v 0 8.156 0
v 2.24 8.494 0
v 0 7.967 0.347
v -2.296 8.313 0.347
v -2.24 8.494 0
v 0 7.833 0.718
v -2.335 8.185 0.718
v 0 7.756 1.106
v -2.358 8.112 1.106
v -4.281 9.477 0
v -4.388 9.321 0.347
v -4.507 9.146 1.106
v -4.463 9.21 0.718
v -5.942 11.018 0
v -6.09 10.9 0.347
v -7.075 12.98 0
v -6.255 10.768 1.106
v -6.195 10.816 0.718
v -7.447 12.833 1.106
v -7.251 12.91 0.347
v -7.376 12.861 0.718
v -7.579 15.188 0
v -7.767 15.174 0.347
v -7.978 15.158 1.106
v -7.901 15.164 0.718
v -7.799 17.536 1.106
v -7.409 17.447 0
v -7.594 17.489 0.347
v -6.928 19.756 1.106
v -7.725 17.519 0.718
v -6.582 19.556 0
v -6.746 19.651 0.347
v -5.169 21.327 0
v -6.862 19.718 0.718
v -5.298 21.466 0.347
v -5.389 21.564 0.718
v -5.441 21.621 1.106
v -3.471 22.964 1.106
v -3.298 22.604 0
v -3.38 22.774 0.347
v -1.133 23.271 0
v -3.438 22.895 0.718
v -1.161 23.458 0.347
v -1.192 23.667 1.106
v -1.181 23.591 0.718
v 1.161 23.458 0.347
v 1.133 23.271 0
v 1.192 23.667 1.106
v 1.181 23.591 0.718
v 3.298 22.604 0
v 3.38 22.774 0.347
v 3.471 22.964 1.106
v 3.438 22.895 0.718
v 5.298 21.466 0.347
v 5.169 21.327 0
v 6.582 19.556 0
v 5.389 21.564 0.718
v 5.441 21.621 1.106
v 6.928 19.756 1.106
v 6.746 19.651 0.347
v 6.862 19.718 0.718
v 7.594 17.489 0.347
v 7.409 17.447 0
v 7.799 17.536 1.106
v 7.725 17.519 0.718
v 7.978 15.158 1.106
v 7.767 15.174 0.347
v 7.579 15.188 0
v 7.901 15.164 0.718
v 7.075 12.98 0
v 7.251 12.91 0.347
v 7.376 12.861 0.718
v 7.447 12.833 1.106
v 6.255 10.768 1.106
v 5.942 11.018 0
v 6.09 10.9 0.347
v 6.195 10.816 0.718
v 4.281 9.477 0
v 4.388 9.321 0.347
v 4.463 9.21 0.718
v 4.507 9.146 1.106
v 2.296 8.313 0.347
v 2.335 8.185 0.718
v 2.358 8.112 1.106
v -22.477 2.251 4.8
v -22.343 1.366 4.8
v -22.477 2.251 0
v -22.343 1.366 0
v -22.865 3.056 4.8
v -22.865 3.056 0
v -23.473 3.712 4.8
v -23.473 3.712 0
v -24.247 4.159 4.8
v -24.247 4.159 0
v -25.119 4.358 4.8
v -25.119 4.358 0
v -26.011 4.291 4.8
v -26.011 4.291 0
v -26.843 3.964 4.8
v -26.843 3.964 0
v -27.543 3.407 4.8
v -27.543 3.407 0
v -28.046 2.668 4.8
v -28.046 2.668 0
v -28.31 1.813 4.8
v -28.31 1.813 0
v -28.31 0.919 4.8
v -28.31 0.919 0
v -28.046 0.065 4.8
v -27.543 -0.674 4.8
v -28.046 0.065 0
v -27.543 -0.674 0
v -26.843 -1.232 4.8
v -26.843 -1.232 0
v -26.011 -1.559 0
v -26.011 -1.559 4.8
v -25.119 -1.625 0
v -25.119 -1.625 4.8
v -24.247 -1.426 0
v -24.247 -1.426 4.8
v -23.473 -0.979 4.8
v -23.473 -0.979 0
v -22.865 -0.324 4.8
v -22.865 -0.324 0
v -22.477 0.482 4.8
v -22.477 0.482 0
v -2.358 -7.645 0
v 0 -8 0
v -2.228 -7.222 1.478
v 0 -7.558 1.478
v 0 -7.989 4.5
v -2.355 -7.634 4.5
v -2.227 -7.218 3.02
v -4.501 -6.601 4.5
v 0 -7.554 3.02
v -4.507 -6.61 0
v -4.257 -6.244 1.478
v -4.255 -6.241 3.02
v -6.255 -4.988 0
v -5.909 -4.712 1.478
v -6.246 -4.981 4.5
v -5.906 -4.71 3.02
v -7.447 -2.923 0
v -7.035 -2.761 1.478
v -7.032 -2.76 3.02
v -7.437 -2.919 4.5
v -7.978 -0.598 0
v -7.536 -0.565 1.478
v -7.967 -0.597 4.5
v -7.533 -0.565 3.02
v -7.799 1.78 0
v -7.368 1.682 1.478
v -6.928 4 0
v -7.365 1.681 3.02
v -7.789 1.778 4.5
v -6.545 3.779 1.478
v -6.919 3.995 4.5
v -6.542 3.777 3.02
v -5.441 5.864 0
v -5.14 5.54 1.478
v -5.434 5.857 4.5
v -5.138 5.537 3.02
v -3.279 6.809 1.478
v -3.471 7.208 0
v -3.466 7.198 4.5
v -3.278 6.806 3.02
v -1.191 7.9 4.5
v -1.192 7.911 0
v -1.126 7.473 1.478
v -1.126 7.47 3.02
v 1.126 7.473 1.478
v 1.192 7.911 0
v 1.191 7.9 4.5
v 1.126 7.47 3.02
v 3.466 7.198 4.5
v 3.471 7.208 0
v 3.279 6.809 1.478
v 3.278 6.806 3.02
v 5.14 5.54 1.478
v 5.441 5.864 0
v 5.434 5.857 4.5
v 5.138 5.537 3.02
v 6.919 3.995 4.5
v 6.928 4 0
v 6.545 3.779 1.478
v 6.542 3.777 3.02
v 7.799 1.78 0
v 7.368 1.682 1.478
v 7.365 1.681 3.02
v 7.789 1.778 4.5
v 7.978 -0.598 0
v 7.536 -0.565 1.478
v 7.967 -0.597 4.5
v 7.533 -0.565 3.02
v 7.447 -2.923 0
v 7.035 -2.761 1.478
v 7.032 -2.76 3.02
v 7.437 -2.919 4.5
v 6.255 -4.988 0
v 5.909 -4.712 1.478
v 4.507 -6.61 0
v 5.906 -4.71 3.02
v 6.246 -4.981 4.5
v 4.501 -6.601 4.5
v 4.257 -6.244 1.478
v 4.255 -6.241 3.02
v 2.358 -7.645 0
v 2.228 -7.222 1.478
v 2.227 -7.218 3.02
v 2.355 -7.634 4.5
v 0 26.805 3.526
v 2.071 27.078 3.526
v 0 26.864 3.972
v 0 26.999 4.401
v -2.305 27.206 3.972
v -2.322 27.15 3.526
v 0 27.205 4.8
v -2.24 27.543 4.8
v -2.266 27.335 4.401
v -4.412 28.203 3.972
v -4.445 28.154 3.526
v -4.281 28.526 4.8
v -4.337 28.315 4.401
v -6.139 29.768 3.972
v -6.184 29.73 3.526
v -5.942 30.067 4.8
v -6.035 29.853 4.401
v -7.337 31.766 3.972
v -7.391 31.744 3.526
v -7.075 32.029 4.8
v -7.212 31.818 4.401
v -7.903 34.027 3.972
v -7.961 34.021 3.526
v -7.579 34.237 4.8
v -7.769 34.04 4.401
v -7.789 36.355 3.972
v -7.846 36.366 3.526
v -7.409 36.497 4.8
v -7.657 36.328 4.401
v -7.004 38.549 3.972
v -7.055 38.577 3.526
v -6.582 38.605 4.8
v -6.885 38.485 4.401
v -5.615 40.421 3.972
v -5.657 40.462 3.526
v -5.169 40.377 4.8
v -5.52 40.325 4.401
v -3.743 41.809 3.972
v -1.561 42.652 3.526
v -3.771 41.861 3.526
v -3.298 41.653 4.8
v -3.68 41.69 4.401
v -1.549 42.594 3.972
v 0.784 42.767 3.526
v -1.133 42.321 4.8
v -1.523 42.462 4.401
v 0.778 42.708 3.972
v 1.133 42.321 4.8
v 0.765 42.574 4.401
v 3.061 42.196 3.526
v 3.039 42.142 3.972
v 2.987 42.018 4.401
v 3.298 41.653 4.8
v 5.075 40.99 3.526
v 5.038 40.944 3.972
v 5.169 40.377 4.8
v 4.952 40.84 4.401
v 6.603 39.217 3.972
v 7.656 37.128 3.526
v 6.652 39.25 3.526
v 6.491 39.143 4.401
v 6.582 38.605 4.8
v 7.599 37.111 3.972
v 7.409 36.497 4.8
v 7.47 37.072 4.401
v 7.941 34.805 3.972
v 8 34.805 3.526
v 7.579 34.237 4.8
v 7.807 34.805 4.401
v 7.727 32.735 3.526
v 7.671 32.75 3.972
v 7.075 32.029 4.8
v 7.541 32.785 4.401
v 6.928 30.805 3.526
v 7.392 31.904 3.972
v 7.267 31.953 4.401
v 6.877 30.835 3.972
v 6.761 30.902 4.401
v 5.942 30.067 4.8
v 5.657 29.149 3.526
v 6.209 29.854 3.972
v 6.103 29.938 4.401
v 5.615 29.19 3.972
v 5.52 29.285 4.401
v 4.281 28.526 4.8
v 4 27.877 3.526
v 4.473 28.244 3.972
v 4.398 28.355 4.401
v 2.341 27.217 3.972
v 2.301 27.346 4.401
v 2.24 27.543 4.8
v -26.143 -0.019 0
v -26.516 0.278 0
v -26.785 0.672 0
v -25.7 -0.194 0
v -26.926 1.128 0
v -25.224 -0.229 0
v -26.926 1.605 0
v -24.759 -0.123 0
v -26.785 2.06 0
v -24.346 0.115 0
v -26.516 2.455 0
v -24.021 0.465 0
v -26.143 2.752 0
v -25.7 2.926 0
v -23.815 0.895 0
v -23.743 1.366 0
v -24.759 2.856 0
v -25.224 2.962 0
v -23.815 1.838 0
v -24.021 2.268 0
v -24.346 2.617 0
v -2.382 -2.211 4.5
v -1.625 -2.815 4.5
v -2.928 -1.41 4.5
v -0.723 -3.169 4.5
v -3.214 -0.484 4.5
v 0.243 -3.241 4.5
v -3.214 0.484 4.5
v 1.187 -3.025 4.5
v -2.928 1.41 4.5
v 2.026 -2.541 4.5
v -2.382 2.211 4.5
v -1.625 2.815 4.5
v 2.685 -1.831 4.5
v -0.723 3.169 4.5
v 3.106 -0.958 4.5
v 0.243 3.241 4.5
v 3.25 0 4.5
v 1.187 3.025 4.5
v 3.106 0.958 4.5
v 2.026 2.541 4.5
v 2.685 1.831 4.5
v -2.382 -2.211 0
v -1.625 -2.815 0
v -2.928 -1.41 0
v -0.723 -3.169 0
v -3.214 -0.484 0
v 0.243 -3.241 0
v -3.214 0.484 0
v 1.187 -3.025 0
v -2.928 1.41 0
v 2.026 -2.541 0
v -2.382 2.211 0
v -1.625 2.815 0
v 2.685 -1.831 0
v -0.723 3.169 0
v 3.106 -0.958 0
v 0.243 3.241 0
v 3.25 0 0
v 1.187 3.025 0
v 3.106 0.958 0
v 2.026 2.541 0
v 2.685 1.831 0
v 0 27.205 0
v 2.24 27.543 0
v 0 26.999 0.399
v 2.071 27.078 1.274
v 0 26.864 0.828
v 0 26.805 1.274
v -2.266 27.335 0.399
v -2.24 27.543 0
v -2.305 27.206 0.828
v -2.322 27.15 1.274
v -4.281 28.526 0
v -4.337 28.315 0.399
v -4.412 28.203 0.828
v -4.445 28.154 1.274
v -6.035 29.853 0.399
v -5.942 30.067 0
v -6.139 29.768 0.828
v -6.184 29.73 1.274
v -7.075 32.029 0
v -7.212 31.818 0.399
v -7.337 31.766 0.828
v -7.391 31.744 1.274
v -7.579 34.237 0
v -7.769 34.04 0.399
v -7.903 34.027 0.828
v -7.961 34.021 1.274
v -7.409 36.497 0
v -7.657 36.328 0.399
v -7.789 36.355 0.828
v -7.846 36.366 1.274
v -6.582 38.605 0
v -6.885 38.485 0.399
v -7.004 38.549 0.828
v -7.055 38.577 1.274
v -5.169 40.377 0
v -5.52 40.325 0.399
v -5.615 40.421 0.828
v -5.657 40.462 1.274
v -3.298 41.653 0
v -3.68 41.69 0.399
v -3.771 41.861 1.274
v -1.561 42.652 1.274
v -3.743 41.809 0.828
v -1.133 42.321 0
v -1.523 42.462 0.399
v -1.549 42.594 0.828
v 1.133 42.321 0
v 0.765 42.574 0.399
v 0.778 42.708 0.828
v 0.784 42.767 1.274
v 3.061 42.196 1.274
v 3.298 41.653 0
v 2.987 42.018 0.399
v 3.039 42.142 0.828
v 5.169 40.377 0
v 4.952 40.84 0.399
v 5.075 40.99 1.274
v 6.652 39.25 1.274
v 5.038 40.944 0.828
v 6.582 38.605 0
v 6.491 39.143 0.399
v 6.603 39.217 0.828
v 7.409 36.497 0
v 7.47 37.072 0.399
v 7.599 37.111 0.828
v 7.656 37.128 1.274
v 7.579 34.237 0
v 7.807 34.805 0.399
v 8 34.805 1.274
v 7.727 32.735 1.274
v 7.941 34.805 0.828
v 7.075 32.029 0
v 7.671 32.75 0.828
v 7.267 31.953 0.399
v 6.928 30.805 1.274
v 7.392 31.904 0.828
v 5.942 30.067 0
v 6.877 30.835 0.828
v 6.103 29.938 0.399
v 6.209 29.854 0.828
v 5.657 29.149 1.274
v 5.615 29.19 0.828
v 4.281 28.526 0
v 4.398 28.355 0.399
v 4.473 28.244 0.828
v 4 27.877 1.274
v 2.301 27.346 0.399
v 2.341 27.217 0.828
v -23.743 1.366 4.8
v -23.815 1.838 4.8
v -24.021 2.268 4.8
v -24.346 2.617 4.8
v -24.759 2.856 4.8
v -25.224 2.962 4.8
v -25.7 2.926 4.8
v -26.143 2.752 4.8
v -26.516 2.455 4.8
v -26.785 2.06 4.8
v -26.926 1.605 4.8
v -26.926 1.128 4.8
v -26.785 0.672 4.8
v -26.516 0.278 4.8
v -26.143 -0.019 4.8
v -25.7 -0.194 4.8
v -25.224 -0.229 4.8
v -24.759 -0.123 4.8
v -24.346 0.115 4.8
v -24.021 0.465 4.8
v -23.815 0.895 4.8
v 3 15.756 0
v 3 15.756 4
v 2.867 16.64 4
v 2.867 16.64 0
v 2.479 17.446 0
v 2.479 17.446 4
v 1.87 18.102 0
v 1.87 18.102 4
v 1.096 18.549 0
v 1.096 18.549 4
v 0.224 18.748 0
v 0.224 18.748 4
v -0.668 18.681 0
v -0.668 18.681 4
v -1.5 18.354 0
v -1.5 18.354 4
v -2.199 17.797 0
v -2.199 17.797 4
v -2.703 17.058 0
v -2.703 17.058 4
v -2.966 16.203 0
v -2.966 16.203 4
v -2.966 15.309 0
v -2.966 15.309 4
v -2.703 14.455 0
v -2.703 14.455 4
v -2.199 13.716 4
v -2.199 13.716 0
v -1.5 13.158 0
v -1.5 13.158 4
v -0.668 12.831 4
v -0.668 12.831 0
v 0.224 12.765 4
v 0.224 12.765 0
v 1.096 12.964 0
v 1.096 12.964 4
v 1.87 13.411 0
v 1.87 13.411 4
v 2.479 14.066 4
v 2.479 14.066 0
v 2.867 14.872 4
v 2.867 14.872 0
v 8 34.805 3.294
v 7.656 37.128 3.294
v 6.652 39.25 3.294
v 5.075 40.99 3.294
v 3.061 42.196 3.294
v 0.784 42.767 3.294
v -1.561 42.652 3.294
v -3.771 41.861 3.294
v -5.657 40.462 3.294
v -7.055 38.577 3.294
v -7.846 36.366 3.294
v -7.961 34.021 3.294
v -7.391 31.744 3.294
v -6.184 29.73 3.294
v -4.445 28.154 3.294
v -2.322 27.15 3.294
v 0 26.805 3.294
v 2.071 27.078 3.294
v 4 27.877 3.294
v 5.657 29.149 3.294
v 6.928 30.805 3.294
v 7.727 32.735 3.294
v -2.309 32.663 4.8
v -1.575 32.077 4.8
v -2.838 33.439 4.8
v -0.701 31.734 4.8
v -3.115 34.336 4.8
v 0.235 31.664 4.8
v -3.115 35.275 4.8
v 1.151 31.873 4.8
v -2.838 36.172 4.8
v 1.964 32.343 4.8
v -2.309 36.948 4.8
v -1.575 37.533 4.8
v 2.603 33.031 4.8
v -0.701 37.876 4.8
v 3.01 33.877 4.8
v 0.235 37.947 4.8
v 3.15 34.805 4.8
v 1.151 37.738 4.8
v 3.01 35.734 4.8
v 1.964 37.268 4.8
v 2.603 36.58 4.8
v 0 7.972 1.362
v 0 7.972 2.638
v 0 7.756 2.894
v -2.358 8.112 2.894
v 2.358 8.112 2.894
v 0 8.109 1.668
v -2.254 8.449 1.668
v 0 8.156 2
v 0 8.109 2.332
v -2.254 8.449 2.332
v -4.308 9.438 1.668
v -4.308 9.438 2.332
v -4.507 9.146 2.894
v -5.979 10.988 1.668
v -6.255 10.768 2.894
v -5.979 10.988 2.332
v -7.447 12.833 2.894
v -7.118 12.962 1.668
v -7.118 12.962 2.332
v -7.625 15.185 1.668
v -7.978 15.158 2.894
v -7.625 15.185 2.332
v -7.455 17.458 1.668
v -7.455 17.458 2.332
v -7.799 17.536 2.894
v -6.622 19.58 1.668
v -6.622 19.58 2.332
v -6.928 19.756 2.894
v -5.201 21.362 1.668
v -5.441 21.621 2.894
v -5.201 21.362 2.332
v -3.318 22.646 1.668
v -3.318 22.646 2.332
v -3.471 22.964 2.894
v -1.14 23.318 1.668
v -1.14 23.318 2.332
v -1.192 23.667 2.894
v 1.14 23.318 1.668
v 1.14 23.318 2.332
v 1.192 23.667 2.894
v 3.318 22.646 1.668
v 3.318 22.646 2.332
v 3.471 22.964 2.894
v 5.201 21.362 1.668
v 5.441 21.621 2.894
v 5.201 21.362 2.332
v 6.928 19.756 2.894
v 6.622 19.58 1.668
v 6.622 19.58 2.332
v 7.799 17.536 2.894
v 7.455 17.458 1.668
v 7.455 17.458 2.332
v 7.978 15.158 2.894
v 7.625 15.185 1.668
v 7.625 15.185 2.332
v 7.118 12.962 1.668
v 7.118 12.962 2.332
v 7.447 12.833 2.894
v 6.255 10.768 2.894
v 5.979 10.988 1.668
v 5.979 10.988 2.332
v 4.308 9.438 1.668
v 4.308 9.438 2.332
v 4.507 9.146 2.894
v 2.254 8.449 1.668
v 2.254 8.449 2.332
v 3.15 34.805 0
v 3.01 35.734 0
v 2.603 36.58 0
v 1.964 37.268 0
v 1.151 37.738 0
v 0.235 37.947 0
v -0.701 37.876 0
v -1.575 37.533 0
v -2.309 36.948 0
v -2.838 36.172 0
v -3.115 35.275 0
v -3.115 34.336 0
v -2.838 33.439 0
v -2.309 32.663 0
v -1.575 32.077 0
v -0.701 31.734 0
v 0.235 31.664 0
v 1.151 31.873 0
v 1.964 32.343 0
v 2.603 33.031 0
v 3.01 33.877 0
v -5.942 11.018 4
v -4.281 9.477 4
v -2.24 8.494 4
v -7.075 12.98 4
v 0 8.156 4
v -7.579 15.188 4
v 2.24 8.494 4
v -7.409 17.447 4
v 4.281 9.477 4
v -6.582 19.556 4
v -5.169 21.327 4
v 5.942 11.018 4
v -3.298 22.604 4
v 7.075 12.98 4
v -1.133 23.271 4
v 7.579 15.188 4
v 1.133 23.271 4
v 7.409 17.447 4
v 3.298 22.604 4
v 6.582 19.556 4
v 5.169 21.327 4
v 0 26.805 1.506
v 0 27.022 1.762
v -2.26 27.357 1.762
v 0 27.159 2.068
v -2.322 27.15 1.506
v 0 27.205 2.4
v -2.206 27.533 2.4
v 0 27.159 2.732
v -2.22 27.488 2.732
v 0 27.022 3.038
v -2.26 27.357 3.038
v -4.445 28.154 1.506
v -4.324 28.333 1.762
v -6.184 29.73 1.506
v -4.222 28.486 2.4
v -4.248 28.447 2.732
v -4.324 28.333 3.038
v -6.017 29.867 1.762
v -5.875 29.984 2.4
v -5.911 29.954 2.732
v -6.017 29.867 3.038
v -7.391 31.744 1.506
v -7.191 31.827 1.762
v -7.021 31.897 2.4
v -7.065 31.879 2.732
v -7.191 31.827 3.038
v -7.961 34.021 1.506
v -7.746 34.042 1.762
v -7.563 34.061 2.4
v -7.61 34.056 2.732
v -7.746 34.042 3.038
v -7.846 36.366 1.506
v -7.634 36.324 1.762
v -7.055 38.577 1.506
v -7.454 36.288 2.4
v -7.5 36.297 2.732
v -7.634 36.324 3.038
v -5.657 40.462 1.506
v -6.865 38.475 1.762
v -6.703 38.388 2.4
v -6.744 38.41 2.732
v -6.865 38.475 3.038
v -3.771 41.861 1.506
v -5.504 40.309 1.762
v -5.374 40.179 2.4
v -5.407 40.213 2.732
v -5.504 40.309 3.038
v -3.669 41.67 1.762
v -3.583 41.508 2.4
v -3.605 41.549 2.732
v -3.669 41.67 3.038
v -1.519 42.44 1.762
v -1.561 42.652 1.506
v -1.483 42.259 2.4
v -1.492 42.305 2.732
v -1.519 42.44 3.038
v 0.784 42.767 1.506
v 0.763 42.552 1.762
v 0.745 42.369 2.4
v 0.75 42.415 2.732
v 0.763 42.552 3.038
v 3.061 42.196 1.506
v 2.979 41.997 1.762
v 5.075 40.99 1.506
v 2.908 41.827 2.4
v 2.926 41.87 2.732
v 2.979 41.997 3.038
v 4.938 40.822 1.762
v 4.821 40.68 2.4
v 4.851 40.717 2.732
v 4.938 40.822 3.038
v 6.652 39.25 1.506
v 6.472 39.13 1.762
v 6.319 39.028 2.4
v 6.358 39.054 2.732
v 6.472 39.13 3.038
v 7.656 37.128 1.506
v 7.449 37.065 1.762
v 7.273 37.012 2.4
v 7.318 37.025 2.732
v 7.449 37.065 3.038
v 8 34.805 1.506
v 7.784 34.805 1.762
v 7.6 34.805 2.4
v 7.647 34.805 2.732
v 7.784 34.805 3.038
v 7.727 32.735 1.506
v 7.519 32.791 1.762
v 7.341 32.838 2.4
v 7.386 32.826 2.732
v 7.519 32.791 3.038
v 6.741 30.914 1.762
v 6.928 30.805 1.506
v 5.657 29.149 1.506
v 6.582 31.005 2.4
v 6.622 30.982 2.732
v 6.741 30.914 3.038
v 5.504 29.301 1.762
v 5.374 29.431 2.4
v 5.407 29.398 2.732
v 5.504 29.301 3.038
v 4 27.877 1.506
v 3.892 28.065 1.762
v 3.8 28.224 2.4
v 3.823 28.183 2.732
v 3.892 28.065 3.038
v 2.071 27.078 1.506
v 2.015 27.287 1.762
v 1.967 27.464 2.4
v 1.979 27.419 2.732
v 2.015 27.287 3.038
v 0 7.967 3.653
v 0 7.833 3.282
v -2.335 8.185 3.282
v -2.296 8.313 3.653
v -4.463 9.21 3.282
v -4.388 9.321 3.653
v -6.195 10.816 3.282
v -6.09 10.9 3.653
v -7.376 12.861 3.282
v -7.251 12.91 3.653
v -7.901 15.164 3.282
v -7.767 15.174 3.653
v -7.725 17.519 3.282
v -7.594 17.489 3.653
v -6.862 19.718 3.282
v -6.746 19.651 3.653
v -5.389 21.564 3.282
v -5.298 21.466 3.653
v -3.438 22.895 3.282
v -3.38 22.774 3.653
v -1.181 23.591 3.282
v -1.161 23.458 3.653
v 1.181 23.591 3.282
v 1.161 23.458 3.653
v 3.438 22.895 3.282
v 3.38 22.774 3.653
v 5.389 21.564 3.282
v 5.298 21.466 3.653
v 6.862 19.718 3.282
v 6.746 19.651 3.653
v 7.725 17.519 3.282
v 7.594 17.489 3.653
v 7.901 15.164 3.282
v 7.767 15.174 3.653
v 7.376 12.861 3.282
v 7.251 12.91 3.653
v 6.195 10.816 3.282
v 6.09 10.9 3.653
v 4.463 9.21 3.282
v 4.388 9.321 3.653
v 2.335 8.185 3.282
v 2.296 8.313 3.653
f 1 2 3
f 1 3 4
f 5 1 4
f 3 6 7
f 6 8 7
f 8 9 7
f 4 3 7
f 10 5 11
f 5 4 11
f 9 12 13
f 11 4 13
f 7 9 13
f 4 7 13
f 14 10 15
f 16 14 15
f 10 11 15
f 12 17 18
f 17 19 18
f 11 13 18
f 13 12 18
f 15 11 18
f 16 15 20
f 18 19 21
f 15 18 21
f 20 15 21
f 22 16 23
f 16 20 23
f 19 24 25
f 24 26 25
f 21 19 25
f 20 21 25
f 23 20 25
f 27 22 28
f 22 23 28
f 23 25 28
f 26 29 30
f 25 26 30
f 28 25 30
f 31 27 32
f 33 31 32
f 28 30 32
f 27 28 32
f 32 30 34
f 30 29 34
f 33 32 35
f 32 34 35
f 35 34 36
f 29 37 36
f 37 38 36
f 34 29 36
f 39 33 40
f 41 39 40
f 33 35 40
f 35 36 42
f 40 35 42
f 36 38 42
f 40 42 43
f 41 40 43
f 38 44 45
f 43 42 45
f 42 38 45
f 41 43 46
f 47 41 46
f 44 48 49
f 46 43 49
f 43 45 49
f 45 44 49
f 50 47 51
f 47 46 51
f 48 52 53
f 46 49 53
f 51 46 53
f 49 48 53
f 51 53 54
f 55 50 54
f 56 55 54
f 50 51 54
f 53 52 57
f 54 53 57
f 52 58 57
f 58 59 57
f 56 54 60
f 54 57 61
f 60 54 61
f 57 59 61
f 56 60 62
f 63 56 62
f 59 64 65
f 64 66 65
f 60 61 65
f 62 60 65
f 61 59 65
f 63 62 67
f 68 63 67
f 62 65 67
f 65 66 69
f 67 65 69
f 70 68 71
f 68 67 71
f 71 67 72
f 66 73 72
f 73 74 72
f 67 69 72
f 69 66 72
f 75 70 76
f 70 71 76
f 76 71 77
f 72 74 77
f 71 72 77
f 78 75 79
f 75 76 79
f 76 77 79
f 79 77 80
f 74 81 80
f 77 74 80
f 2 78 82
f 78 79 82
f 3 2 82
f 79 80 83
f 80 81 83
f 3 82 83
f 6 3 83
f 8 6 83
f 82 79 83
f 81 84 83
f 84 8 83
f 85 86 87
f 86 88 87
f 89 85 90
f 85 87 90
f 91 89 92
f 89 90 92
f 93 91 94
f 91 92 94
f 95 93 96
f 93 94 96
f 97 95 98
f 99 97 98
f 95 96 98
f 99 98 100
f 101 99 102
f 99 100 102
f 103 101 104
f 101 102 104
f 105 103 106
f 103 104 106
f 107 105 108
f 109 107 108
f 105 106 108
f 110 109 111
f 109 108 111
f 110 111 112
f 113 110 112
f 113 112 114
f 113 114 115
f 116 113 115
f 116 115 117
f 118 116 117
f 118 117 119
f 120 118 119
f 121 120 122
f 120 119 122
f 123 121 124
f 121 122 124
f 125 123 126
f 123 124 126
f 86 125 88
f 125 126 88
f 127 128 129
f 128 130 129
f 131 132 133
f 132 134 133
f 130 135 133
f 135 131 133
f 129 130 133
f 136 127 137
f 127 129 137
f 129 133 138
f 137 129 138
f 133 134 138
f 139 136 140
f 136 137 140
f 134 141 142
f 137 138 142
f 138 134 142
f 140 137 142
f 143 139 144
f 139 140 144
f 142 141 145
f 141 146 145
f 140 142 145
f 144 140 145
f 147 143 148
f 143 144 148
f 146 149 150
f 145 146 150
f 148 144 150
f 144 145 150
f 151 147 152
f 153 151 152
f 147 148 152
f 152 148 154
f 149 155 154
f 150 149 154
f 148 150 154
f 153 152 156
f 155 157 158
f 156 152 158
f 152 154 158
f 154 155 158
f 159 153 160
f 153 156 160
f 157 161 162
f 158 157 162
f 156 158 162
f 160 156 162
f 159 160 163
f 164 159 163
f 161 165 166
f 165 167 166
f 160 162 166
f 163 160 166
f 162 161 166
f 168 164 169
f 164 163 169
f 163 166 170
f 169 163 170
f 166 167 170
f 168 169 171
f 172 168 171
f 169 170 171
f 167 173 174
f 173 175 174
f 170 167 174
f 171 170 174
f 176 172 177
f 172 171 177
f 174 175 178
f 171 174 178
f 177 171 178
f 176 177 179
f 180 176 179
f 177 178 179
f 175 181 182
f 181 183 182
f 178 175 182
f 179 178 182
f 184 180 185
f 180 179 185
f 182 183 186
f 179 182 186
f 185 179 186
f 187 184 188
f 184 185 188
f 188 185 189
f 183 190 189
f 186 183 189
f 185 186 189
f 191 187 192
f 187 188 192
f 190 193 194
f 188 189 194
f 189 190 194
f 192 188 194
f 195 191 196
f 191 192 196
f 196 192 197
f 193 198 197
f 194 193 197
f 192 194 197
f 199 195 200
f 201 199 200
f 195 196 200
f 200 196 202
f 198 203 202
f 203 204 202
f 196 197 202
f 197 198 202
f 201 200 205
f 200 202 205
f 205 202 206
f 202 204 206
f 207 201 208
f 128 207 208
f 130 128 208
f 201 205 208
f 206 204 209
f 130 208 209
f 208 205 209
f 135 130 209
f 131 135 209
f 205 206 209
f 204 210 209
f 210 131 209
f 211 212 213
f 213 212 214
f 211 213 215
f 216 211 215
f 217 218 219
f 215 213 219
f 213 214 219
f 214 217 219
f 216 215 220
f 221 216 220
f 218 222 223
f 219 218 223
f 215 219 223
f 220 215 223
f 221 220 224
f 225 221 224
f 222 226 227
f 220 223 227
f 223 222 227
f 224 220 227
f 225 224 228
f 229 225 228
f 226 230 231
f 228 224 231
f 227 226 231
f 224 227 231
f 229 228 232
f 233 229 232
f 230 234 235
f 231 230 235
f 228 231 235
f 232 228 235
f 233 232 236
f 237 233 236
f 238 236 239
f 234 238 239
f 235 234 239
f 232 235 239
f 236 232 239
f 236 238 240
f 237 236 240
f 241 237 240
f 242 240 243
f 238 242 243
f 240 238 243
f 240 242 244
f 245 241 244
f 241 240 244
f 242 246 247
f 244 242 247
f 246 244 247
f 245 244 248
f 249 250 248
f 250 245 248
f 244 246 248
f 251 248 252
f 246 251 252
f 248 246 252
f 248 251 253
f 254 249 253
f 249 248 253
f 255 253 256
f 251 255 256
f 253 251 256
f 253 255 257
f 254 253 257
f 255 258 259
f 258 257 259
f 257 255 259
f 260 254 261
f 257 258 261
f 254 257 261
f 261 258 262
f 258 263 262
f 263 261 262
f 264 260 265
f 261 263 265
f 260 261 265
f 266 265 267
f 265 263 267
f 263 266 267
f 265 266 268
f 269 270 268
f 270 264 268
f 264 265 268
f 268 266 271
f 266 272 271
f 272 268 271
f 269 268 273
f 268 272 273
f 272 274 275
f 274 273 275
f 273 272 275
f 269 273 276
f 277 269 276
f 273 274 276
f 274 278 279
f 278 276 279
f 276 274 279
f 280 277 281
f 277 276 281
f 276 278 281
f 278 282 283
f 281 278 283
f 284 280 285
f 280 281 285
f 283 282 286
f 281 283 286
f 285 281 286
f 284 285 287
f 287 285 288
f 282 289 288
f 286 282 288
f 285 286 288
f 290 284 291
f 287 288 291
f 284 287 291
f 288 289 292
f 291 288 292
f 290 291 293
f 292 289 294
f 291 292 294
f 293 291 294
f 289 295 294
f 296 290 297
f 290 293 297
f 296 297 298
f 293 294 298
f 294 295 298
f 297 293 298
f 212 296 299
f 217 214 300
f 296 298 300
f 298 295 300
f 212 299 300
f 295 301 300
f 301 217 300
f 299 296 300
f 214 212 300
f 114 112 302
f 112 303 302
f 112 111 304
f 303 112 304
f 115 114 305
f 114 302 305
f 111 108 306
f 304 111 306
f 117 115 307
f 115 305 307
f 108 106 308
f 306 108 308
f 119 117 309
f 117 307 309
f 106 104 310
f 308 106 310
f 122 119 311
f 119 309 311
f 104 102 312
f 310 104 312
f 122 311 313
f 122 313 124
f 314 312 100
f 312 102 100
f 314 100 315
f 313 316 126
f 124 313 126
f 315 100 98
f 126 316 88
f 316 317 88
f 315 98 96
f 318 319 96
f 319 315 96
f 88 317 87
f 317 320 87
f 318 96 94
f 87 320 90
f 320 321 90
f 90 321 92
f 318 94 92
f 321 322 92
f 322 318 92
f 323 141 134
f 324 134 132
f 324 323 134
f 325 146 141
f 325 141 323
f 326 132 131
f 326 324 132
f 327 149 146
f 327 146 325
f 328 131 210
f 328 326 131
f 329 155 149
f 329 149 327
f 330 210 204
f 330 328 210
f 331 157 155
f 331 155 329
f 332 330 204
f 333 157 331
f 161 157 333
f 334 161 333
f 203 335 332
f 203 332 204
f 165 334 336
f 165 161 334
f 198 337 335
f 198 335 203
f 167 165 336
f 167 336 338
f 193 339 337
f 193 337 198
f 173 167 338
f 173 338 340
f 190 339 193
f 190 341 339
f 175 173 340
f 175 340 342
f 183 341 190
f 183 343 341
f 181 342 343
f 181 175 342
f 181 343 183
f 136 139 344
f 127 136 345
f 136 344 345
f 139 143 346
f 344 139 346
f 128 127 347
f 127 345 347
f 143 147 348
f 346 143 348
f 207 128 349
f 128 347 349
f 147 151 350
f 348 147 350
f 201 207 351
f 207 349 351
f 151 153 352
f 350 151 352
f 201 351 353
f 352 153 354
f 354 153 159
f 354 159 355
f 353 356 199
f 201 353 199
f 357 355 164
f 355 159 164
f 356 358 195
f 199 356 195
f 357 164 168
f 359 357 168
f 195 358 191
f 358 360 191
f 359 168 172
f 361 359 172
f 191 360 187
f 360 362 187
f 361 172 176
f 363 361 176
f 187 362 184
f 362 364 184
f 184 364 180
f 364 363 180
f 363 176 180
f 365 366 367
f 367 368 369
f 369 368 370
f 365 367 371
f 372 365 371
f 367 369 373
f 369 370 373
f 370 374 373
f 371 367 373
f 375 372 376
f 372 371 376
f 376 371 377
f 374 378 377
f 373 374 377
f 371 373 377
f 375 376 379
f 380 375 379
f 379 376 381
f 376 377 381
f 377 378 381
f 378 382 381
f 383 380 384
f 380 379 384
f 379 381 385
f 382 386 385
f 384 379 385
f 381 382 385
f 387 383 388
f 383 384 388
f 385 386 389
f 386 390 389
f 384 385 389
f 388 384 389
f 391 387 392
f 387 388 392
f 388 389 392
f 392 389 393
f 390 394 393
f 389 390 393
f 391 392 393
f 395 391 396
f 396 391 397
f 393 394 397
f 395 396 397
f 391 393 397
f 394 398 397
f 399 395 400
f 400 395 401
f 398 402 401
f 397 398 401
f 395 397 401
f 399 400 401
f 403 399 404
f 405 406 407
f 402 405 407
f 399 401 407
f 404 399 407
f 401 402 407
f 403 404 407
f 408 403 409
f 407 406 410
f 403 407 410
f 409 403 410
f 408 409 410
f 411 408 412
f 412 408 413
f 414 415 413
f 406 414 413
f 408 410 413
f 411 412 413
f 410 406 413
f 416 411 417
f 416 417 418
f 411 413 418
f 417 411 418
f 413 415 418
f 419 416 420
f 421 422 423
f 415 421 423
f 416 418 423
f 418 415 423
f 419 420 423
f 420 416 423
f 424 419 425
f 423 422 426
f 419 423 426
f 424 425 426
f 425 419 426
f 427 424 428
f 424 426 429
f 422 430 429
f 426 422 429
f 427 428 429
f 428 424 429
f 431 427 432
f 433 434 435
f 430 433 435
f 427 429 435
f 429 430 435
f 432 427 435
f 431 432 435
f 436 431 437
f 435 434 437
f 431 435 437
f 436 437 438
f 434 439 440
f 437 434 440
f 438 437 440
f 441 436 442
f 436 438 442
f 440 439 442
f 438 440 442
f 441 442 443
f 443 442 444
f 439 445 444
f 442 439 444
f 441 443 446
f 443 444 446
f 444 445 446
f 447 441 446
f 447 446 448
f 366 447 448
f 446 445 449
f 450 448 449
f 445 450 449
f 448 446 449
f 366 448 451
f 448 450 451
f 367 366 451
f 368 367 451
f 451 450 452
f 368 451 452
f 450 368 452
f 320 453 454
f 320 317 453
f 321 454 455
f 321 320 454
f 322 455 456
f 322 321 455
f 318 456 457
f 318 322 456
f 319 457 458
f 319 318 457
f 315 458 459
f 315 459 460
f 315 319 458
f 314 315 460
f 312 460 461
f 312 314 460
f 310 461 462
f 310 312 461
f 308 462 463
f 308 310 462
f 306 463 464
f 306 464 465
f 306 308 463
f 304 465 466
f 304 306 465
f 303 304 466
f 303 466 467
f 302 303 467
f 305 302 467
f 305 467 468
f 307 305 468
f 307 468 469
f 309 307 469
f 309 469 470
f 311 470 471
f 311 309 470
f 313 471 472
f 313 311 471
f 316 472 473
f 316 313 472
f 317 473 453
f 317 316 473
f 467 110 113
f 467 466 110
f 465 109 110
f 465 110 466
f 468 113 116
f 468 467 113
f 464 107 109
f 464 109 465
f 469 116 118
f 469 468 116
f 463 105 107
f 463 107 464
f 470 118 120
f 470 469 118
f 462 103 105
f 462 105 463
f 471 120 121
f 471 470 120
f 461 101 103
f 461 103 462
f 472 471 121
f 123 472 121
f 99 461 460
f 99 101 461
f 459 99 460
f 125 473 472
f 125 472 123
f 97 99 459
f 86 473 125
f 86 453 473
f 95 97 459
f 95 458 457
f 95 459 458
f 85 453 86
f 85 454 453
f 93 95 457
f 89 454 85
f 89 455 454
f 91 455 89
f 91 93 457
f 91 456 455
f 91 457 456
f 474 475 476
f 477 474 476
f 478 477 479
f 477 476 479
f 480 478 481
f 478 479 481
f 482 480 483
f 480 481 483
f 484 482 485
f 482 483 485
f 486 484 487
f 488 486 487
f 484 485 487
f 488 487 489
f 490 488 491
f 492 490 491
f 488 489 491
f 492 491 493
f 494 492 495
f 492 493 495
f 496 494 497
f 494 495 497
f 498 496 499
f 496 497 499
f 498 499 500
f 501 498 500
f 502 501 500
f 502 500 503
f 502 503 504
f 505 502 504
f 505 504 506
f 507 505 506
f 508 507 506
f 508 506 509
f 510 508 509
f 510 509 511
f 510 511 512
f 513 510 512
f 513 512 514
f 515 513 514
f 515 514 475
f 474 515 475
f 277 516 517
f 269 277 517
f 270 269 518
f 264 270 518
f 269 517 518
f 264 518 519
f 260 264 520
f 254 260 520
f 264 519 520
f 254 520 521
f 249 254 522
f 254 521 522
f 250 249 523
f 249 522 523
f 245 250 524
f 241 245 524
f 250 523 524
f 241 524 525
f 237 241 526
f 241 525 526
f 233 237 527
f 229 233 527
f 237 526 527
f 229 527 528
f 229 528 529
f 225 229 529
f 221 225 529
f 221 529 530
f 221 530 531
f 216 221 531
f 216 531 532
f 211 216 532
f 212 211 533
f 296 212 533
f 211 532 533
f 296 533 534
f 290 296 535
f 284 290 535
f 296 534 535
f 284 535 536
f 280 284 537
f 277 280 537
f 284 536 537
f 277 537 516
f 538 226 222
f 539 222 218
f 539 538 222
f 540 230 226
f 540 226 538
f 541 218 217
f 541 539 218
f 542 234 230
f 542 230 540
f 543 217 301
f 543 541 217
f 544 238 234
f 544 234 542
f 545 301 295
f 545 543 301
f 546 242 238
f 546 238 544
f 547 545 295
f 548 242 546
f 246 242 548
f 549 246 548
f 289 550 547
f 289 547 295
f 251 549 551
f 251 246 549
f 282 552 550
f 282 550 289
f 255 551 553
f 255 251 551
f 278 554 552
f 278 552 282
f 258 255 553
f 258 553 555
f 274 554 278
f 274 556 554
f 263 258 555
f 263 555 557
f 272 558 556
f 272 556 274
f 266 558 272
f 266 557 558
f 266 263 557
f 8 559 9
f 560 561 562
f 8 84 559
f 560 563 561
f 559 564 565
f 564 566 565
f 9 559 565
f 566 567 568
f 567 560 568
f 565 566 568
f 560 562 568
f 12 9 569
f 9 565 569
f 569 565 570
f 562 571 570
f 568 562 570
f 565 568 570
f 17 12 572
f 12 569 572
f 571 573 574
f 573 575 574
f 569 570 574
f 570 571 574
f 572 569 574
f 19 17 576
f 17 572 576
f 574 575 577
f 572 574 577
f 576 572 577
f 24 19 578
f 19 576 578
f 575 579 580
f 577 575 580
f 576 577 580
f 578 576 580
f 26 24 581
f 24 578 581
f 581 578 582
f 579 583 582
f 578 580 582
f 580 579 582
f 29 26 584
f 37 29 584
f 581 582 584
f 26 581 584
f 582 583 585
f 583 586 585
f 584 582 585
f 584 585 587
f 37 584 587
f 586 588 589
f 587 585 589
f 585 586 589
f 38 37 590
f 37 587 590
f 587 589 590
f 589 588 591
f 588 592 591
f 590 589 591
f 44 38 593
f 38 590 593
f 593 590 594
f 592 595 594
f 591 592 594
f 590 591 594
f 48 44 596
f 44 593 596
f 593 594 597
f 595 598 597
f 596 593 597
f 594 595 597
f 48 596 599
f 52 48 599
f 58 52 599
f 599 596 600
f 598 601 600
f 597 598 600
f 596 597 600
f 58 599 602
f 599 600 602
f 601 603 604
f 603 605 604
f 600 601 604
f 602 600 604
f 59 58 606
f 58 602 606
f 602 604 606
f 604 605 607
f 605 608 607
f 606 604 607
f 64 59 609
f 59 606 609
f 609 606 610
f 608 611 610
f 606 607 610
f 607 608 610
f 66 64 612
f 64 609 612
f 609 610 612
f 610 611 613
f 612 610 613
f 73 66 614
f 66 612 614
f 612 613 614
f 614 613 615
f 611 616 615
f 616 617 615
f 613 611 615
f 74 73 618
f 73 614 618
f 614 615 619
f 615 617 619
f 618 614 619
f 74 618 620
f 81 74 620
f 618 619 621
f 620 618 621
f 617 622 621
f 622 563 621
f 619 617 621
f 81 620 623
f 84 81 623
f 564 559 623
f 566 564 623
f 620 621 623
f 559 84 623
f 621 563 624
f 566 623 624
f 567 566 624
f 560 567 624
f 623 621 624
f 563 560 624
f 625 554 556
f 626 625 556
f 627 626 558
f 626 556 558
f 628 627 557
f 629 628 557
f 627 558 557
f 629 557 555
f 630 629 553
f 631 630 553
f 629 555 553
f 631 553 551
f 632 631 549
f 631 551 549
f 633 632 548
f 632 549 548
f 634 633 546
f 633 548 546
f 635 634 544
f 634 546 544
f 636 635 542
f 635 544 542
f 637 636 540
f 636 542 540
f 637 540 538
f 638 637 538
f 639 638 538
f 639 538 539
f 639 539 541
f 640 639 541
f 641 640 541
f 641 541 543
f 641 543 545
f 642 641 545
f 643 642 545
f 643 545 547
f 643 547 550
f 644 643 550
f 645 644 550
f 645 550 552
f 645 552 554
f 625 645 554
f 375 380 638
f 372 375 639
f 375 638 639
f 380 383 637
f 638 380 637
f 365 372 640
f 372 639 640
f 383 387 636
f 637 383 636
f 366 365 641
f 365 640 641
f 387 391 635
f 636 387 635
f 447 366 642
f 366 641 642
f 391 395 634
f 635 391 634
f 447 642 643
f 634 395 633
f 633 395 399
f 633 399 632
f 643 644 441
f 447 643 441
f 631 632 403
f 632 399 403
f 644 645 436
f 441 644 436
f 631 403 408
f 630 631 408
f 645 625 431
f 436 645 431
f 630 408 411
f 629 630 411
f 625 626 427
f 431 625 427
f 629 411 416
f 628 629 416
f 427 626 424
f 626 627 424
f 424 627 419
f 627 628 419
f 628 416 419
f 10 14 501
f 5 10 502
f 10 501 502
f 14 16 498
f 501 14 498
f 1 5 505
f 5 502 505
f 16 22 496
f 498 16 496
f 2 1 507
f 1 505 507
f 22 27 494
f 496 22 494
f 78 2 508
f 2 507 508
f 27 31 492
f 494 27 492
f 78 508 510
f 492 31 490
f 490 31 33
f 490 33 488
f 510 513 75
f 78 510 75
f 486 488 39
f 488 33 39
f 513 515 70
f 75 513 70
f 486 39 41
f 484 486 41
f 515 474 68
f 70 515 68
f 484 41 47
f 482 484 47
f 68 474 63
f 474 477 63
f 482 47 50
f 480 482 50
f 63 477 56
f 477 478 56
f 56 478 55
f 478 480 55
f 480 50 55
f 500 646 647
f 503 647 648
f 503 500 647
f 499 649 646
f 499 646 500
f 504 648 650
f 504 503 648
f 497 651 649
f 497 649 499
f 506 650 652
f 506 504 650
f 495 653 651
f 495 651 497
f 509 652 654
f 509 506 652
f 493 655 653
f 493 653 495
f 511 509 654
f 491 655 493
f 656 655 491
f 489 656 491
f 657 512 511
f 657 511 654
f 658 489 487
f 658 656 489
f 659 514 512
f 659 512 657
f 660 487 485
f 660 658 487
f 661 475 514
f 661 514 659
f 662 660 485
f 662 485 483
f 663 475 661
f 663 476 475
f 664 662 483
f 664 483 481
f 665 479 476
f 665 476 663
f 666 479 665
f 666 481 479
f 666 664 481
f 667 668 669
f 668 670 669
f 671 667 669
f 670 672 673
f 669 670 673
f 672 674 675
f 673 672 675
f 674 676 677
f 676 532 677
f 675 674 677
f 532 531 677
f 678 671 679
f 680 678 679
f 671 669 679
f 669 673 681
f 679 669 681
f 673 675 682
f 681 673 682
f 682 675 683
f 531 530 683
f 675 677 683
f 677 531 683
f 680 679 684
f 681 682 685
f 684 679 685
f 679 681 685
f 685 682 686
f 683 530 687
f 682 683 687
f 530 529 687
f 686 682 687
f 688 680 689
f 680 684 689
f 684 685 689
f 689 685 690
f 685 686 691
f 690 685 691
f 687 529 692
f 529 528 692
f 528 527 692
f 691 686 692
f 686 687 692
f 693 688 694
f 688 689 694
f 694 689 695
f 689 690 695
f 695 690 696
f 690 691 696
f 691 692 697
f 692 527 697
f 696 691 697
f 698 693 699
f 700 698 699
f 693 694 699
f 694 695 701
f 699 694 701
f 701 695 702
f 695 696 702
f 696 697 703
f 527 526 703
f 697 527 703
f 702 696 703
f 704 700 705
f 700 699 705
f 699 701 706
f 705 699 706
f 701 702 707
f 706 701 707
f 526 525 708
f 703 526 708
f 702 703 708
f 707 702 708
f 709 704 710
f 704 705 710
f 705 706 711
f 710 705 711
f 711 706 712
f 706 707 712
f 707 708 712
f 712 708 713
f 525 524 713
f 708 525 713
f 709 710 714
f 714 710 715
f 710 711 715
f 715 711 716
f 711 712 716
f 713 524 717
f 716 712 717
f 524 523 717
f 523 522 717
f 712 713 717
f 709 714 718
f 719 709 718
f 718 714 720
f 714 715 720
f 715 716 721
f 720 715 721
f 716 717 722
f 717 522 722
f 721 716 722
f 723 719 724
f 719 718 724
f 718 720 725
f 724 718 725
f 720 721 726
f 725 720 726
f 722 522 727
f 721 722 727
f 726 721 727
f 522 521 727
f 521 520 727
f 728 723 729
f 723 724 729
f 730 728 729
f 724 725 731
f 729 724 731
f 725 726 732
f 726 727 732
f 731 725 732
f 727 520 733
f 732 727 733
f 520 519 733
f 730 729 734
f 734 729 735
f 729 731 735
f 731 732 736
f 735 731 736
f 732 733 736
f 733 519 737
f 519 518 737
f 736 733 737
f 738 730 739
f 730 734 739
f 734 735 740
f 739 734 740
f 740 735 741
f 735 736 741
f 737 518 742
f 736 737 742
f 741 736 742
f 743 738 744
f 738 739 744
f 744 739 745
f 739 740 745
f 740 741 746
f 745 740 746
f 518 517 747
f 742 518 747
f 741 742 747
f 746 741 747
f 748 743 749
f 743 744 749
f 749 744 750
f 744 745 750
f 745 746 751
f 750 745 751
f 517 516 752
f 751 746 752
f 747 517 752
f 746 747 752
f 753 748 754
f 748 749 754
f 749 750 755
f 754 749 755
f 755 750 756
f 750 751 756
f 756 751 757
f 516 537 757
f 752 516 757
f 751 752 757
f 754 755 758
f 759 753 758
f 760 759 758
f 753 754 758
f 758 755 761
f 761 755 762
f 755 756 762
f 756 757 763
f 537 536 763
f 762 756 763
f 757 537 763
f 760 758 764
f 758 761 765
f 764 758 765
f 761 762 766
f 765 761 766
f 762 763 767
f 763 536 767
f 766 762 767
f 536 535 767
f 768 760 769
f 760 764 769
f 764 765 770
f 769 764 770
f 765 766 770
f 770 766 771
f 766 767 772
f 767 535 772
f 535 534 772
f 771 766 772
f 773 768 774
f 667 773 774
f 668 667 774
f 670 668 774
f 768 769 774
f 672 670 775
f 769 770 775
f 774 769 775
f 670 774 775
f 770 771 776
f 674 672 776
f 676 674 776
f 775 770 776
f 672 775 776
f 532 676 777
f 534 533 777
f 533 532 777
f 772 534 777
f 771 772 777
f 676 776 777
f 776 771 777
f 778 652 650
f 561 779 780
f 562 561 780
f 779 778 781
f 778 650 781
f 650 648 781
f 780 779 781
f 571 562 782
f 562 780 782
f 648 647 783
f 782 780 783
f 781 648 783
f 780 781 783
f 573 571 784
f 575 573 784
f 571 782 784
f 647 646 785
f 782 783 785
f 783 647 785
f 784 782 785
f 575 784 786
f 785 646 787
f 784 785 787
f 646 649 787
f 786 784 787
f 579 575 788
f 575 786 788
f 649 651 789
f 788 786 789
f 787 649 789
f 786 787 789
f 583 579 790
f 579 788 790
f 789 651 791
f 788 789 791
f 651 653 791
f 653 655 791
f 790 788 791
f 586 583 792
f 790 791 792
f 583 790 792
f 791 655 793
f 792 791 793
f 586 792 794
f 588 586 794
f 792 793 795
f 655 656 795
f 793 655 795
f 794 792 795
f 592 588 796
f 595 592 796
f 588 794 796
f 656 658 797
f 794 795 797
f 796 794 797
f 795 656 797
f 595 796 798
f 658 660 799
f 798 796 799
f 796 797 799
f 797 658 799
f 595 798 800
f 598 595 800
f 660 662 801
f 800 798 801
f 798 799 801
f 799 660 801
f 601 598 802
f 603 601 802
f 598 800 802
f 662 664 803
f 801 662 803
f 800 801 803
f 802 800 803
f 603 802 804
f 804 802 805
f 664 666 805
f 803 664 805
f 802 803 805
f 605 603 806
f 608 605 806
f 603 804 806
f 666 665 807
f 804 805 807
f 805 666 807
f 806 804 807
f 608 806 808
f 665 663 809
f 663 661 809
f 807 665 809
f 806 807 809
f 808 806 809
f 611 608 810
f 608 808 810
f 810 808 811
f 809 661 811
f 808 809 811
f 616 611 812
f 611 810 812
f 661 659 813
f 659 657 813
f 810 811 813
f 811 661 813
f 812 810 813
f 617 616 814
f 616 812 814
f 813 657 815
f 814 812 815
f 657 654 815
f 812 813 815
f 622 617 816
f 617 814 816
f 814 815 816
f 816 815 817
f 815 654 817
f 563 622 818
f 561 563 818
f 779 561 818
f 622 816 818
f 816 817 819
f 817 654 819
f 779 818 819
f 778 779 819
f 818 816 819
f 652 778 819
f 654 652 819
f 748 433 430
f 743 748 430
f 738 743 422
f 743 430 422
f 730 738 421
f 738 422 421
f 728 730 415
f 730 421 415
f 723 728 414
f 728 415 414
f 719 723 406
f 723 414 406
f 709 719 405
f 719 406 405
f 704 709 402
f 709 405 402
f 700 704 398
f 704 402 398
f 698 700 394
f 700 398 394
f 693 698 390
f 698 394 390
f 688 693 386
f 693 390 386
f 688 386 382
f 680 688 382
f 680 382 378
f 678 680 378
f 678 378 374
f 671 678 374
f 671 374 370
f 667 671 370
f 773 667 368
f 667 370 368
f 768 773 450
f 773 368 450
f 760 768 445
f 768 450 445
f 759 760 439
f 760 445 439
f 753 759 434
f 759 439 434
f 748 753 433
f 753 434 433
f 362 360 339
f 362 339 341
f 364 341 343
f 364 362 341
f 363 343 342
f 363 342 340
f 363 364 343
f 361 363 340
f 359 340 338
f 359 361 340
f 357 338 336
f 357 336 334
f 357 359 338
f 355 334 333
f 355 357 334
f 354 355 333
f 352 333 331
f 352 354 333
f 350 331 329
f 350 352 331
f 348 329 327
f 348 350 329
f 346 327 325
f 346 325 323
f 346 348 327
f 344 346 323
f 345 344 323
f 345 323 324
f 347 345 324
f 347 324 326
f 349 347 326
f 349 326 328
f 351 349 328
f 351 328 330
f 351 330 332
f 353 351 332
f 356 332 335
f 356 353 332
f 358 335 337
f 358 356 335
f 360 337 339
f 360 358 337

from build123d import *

# Parameters (mm, degrees)
F0_R           = 3
F0_R_2         = 1.6
F1_DEPTH       = 4
F0_R_3         = 8
F2_DEPTH       = 0.8
F3_R           = 3
F4_DEPTH       = 25
F4_DEPTH_BACK  = 25
F11_DEPTH      = 0.8
F12_R          = 3.15
F13_DEPTH      = 25
F13_DEPTH_BACK = 25
F14_R          = 8
F14_R_2        = 3.25
F15_DEPTH      = 4.5


with BuildPart() as f1:
    # F0 (on Top) → F1 (new body)
    with BuildSketch(Plane.XY):
        with Locations((-25.3434665501, 1.3662634883)):
            Circle(F0_R)
        with Locations((-25.3434665501, 1.3662634883)):
            Circle(F0_R_2, mode=Mode.SUBTRACT)
    extrude(amount=F1_DEPTH)

    # F11 (add): a face of the model
    f11_faces = [f1.faces().sort_by_distance(p)[0] for p in [
        (-28.2586137364, 1.3662634883, 4),
    ]]
    extrude(f11_faces, amount=F11_DEPTH)


with BuildPart() as f1b:
    # F0 (on Top) → F1, piece 2 (new body)
    with BuildSketch(Plane.XY):
        with Locations((0, 15.7561581582)):
            Circle(F0_R_3)
    extrude(amount=F1_DEPTH)


with BuildPart() as f1c:
    # F0 (on Top) → F1, piece 3 (new body)
    with BuildSketch(Plane.XY):
        with Locations((0, 34.8054356873)):
            Circle(F0_R_3)
    extrude(amount=F1_DEPTH)

    # F2 (add): a face of the model
    f2_faces = [f1c.faces().sort_by_distance(p)[0] for p in [
        (0, 34.8054356873, 4),
    ]]
    extrude(f2_faces, amount=F2_DEPTH)


with BuildPart() as f4_tool:
    # F3 (on face) → F4 (new body, two sides)
    with BuildSketch(Plane.XY.offset(4)) as f4_sk:
        with Locations((0, 15.7561581582)):
            Circle(F3_R)
        with Locations((0, 34.8054356873)):
            Circle(F3_R)
    extrude(amount=-F4_DEPTH)
    extrude(f4_sk.sketch, amount=F4_DEPTH_BACK)


with BuildPart() as f1b_1:
    add(f1b.part)

    # F4: cut by f4_tool
    add(f4_tool.part, mode=Mode.SUBTRACT)

    # F6 (on Right) → F7 (revolve, cut)
    with BuildSketch(Plane.YZ):
        with BuildLine():
            ThreePointArc((8.1561581582, 0), (7.8928465089, 0.5298800346), (7.7561581582, 1.105572809))
            ThreePointArc((7.7561581582, 1.105572809), (8.1561581582, 2), (7.7561581582, 2.894427191))
            ThreePointArc((7.7561581582, 2.894427191), (7.8928465089, 3.4701199654), (8.1561581582, 4))
            Line((8.1561581582, 4), (7.7561581582, 4))
            Line((7.7561581582, 4), (1.3885094086, 4))
            Line((1.3885094086, 4), (1.3885094086, 0))
            Line((1.3885094086, 0), (8.1561581582, 0))
        make_face()
    revolve(axis=Axis((0, 15.7561581582, 3), (0, 0, -1)), mode=Mode.SUBTRACT)


with BuildPart() as f1c_1:
    add(f1c.part)

    # F4: cut by f4_tool
    add(f4_tool.part, mode=Mode.SUBTRACT)

    # F9 (on Right) → F10 (revolve, cut)
    with BuildSketch(Plane.YZ):
        with BuildLine():
            ThreePointArc((27.2054356873, 0), (26.8900265118, 0.7221245395), (26.8054356873, 1.505572809))
            ThreePointArc((26.8054356873, 1.505572809), (27.2054356873, 2.4), (26.8054356873, 3.294427191))
            ThreePointArc((26.8054356873, 3.294427191), (26.8900265118, 4.0778754605), (27.2054356873, 4.8))
            ThreePointArc((27.2054356873, 4.8), (9.199474241, 2.4), (27.2054356873, 0))
        make_face()
    revolve(axis=Axis((0, 34.8054356873, 3.6), (0, 0, -1)), mode=Mode.SUBTRACT)

    # F12 (on face) → F13 (cut, two sides)
    with BuildSketch(Plane.XY.offset(4.8)) as f13_sk:
        with Locations((0, 34.8054356873)):
            Circle(F12_R)
        with Locations((0, 15.7561581582)):
            Circle(F12_R)
    extrude(amount=-F13_DEPTH, mode=Mode.SUBTRACT)
    extrude(f13_sk.sketch, amount=F13_DEPTH_BACK, mode=Mode.SUBTRACT)


with BuildPart() as f15:
    # F14 (on Top) → F15 (new body)
    with BuildSketch(Plane.XY):
        Circle(F14_R)
        Circle(F14_R_2, mode=Mode.SUBTRACT)
    extrude(amount=F15_DEPTH)

    # F16 (on Right) → F17 (revolve, cut)
    with BuildSketch(Plane.YZ):
        with BuildLine():
            ThreePointArc((-8, 4.5229381791), (-17.8737479846, 2.2614690895), (-8, 0))
            ThreePointArc((-8, 0), (-7.5, 2.2614690895), (-8, 4.5229381791))
        make_face()
    revolve(axis=Axis((0, 0, 2.25), (0, 0, -1)), mode=Mode.SUBTRACT)


solid = Compound([f1.part, f1b_1.part, f1c_1.part, f15.part])
